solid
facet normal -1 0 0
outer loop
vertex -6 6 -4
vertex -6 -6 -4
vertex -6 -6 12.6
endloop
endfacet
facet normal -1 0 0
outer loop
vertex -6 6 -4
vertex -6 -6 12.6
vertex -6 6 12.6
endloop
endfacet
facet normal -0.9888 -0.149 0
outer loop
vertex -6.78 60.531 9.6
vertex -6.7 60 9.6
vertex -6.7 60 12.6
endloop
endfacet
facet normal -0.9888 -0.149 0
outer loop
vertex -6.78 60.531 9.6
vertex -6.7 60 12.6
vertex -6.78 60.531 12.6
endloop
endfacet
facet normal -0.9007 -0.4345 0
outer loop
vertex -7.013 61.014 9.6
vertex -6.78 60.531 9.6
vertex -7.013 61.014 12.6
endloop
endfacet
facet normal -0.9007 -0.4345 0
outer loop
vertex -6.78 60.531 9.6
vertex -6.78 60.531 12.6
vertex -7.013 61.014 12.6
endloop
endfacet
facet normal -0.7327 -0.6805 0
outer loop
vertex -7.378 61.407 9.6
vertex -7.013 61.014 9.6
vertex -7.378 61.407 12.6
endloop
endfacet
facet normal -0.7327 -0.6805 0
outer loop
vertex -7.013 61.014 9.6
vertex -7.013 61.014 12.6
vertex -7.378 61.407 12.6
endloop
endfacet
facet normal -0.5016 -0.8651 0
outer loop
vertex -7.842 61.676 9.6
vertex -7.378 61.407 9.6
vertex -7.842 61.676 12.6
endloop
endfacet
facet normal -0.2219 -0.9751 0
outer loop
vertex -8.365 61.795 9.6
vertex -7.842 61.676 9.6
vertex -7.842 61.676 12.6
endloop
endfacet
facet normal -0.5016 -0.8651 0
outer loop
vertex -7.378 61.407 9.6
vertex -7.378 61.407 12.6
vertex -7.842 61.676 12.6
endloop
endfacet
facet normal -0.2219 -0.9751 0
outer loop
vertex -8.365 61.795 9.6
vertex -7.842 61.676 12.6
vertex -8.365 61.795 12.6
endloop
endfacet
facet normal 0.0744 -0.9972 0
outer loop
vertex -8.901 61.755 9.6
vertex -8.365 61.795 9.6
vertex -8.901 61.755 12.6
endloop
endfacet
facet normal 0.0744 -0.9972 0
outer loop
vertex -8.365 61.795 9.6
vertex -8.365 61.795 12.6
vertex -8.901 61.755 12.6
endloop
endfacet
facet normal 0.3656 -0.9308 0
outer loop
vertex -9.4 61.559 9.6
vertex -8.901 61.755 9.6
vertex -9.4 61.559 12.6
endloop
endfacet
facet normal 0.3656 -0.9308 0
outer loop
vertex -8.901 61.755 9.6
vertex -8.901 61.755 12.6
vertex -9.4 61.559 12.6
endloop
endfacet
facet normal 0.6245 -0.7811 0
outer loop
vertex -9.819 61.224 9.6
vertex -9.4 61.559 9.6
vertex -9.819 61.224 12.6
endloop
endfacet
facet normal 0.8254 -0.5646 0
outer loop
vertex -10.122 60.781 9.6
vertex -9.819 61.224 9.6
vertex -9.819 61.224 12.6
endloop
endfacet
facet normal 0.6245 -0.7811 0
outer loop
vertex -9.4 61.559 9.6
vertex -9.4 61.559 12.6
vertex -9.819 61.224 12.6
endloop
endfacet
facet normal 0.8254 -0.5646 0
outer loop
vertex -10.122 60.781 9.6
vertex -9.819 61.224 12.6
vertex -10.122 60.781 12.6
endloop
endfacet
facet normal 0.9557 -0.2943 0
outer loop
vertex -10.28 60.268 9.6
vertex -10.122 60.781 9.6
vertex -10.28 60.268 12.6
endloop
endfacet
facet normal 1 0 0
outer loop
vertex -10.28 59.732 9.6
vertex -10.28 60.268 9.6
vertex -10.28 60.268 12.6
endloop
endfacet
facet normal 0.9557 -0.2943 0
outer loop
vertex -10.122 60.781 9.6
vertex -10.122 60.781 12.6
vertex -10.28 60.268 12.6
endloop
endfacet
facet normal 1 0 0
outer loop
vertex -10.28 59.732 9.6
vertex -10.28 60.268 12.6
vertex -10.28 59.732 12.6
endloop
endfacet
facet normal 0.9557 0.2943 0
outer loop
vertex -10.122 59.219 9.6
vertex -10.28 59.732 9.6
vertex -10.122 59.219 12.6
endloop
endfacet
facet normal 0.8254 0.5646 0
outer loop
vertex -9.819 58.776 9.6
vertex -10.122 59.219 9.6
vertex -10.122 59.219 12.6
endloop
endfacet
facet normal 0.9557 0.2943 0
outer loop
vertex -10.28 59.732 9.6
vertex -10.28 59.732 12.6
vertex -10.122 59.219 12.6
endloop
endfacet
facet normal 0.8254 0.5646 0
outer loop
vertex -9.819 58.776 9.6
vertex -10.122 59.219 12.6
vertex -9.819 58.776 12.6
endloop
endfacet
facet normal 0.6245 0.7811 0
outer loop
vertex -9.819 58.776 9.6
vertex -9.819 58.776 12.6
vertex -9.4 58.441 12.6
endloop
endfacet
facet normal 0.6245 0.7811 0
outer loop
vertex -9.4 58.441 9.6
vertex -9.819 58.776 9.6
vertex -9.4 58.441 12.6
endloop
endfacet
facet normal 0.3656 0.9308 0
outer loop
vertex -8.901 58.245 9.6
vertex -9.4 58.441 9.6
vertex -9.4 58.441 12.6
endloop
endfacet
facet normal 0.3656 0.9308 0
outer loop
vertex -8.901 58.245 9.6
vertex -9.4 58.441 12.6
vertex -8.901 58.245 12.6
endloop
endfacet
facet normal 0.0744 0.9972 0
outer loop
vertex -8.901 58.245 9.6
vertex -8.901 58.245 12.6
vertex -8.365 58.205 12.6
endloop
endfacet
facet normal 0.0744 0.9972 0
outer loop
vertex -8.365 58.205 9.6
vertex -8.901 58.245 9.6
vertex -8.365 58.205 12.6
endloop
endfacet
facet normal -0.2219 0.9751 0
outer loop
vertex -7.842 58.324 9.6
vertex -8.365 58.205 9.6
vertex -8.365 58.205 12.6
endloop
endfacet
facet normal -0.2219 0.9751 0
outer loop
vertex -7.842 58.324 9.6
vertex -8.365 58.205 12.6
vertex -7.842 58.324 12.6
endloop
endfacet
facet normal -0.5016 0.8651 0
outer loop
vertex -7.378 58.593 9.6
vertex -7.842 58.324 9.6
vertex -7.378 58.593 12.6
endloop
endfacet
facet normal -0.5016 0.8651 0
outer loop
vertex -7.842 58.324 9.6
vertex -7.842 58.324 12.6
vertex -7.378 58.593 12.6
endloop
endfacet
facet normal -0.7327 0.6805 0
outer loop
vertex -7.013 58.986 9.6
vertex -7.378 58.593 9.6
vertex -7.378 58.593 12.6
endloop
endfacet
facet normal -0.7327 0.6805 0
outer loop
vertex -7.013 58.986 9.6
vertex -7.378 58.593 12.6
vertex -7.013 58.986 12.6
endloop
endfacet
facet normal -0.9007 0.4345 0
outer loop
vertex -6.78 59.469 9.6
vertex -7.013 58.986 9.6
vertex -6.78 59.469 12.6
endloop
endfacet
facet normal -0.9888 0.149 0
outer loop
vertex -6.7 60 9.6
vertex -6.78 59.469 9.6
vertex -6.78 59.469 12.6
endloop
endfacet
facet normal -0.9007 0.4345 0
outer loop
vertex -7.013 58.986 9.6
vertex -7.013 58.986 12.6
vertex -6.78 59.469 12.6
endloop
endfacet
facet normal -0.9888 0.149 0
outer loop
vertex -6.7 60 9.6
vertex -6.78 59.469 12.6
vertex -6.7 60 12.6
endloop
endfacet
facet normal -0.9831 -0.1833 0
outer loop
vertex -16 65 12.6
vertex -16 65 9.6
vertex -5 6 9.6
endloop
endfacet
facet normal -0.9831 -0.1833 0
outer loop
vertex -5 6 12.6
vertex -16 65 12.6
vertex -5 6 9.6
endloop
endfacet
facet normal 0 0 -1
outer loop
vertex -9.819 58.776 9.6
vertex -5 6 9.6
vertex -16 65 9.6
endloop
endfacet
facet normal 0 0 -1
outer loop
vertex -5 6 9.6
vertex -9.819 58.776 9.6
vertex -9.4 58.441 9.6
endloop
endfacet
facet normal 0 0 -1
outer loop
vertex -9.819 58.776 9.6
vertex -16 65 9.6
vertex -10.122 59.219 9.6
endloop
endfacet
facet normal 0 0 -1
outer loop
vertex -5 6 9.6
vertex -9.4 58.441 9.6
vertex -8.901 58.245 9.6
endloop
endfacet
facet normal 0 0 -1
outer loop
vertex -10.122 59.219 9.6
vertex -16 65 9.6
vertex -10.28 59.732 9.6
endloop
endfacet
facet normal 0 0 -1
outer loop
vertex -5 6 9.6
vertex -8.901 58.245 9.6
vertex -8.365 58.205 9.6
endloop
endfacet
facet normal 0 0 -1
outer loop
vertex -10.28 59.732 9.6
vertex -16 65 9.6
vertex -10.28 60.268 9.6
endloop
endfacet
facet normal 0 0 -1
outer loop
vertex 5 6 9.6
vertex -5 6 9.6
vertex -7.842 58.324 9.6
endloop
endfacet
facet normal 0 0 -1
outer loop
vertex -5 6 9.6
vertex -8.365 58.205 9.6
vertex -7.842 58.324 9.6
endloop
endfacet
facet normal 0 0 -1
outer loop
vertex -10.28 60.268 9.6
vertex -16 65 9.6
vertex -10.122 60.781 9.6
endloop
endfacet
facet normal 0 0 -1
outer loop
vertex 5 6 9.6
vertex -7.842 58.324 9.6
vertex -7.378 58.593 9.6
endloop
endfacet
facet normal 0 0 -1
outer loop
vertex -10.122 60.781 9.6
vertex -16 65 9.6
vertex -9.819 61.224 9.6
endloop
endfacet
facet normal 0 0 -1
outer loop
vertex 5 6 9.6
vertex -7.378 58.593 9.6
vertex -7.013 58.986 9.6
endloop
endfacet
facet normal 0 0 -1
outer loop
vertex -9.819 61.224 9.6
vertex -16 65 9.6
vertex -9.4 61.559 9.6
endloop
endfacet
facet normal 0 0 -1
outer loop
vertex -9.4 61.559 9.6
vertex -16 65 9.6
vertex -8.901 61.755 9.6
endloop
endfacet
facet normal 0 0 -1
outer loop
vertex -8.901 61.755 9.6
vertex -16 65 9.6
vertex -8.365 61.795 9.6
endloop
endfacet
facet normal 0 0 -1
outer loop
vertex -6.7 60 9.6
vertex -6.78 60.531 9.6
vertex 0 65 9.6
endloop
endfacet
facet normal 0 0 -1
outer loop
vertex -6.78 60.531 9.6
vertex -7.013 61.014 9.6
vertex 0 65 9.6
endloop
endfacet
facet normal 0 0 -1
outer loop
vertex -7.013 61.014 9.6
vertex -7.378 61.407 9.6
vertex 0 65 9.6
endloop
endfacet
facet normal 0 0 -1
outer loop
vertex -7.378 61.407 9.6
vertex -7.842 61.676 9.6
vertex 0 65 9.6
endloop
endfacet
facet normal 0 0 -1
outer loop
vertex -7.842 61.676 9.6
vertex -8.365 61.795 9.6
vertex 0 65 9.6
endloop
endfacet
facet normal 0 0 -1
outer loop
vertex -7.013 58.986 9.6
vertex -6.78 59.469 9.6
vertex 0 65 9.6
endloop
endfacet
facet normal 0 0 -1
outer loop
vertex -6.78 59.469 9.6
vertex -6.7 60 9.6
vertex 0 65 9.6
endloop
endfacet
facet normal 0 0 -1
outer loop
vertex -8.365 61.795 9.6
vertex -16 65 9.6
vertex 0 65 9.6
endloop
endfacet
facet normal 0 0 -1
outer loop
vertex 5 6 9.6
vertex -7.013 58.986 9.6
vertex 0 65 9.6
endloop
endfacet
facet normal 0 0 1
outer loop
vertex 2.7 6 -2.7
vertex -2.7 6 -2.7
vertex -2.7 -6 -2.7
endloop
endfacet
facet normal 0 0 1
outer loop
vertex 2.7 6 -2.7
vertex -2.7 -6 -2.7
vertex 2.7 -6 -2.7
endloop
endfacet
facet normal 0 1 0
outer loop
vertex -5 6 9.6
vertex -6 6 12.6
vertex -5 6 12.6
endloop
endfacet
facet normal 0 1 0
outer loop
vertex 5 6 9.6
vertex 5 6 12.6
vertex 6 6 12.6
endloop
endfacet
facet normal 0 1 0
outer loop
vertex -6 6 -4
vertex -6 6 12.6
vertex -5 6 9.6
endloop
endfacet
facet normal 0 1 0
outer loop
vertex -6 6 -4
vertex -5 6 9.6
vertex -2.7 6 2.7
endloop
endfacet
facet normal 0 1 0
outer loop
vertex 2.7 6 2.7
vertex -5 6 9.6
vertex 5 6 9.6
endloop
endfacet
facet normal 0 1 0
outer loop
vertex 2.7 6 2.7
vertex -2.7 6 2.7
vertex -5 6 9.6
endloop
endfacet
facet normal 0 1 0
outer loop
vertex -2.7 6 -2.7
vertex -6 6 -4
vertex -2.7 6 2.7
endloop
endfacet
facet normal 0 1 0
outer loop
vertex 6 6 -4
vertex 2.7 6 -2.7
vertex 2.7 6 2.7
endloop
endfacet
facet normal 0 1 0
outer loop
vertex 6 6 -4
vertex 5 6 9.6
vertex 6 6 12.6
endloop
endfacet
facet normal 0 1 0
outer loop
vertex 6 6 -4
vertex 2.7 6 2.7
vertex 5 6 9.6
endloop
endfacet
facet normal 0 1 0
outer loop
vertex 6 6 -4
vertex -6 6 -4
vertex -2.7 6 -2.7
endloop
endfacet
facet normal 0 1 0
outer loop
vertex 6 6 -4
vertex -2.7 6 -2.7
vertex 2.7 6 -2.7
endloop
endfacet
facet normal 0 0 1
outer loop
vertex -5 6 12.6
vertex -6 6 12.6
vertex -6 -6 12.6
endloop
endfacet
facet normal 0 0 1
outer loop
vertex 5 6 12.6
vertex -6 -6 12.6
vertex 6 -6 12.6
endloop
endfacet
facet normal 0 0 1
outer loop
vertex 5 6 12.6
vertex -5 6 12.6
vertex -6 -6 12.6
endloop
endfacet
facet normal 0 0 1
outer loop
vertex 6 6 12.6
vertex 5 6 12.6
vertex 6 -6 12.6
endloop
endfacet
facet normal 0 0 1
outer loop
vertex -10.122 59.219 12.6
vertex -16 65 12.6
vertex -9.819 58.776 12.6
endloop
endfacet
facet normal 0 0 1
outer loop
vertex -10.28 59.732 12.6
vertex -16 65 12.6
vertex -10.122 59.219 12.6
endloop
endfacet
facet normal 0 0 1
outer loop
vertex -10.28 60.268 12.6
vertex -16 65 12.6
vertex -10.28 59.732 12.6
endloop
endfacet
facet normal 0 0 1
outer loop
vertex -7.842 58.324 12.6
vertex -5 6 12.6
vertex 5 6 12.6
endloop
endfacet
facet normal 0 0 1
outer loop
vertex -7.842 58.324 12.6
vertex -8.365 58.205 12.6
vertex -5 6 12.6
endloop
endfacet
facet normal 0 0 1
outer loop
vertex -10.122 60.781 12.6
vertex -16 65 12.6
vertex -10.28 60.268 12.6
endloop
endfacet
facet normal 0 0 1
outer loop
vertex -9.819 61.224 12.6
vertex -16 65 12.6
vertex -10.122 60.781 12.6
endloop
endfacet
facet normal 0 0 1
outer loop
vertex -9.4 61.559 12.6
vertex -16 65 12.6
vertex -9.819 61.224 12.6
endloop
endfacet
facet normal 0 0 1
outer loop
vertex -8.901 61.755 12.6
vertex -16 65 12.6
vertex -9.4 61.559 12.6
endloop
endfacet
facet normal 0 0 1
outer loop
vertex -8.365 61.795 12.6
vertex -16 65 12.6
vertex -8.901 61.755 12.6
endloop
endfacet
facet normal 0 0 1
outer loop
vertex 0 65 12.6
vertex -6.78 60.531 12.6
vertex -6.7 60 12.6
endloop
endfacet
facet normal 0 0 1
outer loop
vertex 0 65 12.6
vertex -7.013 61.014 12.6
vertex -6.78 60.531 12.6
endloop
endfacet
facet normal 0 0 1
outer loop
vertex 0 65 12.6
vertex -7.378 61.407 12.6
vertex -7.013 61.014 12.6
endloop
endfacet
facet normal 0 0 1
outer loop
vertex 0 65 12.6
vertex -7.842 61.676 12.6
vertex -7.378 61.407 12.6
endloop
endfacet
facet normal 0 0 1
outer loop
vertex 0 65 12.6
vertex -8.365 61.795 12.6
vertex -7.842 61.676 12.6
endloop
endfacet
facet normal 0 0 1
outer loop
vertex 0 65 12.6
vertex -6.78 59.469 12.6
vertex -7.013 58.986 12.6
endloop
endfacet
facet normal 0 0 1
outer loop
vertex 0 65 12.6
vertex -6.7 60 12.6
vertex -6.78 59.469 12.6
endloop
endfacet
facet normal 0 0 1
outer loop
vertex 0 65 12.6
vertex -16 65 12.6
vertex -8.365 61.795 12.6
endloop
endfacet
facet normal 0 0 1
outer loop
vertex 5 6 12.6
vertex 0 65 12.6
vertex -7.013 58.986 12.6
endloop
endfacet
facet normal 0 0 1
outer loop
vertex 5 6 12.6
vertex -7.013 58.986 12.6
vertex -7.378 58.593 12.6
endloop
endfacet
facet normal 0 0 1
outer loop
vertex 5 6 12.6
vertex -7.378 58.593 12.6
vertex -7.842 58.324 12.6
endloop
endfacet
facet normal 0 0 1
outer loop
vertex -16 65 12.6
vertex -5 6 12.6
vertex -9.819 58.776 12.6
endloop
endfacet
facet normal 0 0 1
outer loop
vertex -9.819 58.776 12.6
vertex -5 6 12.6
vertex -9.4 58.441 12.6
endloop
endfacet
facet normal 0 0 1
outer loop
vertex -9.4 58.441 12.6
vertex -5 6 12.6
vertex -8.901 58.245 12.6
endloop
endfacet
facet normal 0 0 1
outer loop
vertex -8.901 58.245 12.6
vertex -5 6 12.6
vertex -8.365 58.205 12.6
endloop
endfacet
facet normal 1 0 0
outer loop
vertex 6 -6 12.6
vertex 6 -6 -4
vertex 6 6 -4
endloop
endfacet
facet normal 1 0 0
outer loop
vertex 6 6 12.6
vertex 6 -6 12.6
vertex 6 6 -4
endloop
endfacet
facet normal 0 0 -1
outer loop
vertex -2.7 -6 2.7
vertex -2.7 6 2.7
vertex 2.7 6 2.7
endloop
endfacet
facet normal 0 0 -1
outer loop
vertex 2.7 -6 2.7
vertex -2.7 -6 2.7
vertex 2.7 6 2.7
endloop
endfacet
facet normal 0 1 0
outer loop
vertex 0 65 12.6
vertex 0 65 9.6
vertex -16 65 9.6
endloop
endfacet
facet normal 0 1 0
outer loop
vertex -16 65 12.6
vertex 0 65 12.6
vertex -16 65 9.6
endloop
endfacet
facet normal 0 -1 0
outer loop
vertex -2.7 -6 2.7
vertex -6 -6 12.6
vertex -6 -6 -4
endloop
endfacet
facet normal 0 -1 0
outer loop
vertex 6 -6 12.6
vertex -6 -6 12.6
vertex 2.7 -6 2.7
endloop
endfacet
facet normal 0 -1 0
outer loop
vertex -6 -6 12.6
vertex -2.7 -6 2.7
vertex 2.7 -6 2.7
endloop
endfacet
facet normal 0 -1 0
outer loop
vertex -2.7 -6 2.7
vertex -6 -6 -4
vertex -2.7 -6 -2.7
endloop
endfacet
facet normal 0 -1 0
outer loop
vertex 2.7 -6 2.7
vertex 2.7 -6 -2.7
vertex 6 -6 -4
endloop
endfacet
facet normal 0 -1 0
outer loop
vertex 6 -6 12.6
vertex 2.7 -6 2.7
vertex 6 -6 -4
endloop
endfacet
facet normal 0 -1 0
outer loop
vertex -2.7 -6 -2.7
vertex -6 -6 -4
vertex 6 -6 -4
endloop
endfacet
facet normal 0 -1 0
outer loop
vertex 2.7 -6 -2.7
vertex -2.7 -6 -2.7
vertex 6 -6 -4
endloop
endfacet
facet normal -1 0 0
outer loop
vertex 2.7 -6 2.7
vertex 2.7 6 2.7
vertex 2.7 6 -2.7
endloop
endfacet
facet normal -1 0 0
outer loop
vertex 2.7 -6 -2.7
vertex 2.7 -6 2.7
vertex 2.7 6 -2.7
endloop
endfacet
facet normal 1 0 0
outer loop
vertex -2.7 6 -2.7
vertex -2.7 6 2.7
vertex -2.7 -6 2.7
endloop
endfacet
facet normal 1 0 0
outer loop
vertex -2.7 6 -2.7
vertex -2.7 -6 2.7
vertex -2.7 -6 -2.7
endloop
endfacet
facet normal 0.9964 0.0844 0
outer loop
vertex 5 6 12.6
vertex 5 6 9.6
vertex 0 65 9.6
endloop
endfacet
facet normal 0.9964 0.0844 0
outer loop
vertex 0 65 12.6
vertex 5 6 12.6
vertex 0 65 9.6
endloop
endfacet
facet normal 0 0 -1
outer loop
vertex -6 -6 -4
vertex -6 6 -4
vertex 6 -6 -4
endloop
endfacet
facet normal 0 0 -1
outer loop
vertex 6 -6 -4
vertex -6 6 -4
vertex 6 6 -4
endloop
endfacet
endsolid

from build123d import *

# Parameters (mm, degrees)
BOSS_EXTRUDE1_START = -4
SKETCH1_W           = 12
SKETCH1_H           = 12
BOSS_EXTRUDE1_DEPTH = 16.6
SKETCH2_W           = 5.4
SKETCH2_H           = 5.4
CUT_EXTRUDE1_DEPTH  = 12
BOSS_EXTRUDE2_START = 9.6
BOSS_EXTRUDE2_DEPTH = 3
SKETCH4_R           = 1.8
CUT_EXTRUDE2_DEPTH  = 25.2


with BuildPart() as part:
    # Sketch1 → Boss-Extrude1 (new body)
    with BuildSketch(Plane.XY.offset(BOSS_EXTRUDE1_START)):
        Rectangle(SKETCH1_W, SKETCH1_H)
    extrude(amount=BOSS_EXTRUDE1_DEPTH)

    # Sketch2 → Cut-Extrude1 (cut, symmetric)
    with BuildSketch(Plane(origin=(0, 0, 0), x_dir=(1, 0, 0), z_dir=(0, 1, 0))):
        Rectangle(SKETCH2_W, SKETCH2_H)
    extrude(amount=CUT_EXTRUDE1_DEPTH, both=True, mode=Mode.SUBTRACT)

    # Sketch3 → Boss-Extrude2 (add)
    with BuildSketch(Plane.XY.offset(BOSS_EXTRUDE2_START)):
        Polygon((-5, 6), (5, 6), (0, 65), (-16, 65), align=None)
    extrude(amount=BOSS_EXTRUDE2_DEPTH)

    # Sketch4 → Cut-Extrude2 (cut, symmetric)
    with BuildSketch(Plane.XY):
        with Locations((-8.5, 60)):
            Circle(SKETCH4_R)
    extrude(amount=CUT_EXTRUDE2_DEPTH, both=True, mode=Mode.SUBTRACT)


solid = part.part
